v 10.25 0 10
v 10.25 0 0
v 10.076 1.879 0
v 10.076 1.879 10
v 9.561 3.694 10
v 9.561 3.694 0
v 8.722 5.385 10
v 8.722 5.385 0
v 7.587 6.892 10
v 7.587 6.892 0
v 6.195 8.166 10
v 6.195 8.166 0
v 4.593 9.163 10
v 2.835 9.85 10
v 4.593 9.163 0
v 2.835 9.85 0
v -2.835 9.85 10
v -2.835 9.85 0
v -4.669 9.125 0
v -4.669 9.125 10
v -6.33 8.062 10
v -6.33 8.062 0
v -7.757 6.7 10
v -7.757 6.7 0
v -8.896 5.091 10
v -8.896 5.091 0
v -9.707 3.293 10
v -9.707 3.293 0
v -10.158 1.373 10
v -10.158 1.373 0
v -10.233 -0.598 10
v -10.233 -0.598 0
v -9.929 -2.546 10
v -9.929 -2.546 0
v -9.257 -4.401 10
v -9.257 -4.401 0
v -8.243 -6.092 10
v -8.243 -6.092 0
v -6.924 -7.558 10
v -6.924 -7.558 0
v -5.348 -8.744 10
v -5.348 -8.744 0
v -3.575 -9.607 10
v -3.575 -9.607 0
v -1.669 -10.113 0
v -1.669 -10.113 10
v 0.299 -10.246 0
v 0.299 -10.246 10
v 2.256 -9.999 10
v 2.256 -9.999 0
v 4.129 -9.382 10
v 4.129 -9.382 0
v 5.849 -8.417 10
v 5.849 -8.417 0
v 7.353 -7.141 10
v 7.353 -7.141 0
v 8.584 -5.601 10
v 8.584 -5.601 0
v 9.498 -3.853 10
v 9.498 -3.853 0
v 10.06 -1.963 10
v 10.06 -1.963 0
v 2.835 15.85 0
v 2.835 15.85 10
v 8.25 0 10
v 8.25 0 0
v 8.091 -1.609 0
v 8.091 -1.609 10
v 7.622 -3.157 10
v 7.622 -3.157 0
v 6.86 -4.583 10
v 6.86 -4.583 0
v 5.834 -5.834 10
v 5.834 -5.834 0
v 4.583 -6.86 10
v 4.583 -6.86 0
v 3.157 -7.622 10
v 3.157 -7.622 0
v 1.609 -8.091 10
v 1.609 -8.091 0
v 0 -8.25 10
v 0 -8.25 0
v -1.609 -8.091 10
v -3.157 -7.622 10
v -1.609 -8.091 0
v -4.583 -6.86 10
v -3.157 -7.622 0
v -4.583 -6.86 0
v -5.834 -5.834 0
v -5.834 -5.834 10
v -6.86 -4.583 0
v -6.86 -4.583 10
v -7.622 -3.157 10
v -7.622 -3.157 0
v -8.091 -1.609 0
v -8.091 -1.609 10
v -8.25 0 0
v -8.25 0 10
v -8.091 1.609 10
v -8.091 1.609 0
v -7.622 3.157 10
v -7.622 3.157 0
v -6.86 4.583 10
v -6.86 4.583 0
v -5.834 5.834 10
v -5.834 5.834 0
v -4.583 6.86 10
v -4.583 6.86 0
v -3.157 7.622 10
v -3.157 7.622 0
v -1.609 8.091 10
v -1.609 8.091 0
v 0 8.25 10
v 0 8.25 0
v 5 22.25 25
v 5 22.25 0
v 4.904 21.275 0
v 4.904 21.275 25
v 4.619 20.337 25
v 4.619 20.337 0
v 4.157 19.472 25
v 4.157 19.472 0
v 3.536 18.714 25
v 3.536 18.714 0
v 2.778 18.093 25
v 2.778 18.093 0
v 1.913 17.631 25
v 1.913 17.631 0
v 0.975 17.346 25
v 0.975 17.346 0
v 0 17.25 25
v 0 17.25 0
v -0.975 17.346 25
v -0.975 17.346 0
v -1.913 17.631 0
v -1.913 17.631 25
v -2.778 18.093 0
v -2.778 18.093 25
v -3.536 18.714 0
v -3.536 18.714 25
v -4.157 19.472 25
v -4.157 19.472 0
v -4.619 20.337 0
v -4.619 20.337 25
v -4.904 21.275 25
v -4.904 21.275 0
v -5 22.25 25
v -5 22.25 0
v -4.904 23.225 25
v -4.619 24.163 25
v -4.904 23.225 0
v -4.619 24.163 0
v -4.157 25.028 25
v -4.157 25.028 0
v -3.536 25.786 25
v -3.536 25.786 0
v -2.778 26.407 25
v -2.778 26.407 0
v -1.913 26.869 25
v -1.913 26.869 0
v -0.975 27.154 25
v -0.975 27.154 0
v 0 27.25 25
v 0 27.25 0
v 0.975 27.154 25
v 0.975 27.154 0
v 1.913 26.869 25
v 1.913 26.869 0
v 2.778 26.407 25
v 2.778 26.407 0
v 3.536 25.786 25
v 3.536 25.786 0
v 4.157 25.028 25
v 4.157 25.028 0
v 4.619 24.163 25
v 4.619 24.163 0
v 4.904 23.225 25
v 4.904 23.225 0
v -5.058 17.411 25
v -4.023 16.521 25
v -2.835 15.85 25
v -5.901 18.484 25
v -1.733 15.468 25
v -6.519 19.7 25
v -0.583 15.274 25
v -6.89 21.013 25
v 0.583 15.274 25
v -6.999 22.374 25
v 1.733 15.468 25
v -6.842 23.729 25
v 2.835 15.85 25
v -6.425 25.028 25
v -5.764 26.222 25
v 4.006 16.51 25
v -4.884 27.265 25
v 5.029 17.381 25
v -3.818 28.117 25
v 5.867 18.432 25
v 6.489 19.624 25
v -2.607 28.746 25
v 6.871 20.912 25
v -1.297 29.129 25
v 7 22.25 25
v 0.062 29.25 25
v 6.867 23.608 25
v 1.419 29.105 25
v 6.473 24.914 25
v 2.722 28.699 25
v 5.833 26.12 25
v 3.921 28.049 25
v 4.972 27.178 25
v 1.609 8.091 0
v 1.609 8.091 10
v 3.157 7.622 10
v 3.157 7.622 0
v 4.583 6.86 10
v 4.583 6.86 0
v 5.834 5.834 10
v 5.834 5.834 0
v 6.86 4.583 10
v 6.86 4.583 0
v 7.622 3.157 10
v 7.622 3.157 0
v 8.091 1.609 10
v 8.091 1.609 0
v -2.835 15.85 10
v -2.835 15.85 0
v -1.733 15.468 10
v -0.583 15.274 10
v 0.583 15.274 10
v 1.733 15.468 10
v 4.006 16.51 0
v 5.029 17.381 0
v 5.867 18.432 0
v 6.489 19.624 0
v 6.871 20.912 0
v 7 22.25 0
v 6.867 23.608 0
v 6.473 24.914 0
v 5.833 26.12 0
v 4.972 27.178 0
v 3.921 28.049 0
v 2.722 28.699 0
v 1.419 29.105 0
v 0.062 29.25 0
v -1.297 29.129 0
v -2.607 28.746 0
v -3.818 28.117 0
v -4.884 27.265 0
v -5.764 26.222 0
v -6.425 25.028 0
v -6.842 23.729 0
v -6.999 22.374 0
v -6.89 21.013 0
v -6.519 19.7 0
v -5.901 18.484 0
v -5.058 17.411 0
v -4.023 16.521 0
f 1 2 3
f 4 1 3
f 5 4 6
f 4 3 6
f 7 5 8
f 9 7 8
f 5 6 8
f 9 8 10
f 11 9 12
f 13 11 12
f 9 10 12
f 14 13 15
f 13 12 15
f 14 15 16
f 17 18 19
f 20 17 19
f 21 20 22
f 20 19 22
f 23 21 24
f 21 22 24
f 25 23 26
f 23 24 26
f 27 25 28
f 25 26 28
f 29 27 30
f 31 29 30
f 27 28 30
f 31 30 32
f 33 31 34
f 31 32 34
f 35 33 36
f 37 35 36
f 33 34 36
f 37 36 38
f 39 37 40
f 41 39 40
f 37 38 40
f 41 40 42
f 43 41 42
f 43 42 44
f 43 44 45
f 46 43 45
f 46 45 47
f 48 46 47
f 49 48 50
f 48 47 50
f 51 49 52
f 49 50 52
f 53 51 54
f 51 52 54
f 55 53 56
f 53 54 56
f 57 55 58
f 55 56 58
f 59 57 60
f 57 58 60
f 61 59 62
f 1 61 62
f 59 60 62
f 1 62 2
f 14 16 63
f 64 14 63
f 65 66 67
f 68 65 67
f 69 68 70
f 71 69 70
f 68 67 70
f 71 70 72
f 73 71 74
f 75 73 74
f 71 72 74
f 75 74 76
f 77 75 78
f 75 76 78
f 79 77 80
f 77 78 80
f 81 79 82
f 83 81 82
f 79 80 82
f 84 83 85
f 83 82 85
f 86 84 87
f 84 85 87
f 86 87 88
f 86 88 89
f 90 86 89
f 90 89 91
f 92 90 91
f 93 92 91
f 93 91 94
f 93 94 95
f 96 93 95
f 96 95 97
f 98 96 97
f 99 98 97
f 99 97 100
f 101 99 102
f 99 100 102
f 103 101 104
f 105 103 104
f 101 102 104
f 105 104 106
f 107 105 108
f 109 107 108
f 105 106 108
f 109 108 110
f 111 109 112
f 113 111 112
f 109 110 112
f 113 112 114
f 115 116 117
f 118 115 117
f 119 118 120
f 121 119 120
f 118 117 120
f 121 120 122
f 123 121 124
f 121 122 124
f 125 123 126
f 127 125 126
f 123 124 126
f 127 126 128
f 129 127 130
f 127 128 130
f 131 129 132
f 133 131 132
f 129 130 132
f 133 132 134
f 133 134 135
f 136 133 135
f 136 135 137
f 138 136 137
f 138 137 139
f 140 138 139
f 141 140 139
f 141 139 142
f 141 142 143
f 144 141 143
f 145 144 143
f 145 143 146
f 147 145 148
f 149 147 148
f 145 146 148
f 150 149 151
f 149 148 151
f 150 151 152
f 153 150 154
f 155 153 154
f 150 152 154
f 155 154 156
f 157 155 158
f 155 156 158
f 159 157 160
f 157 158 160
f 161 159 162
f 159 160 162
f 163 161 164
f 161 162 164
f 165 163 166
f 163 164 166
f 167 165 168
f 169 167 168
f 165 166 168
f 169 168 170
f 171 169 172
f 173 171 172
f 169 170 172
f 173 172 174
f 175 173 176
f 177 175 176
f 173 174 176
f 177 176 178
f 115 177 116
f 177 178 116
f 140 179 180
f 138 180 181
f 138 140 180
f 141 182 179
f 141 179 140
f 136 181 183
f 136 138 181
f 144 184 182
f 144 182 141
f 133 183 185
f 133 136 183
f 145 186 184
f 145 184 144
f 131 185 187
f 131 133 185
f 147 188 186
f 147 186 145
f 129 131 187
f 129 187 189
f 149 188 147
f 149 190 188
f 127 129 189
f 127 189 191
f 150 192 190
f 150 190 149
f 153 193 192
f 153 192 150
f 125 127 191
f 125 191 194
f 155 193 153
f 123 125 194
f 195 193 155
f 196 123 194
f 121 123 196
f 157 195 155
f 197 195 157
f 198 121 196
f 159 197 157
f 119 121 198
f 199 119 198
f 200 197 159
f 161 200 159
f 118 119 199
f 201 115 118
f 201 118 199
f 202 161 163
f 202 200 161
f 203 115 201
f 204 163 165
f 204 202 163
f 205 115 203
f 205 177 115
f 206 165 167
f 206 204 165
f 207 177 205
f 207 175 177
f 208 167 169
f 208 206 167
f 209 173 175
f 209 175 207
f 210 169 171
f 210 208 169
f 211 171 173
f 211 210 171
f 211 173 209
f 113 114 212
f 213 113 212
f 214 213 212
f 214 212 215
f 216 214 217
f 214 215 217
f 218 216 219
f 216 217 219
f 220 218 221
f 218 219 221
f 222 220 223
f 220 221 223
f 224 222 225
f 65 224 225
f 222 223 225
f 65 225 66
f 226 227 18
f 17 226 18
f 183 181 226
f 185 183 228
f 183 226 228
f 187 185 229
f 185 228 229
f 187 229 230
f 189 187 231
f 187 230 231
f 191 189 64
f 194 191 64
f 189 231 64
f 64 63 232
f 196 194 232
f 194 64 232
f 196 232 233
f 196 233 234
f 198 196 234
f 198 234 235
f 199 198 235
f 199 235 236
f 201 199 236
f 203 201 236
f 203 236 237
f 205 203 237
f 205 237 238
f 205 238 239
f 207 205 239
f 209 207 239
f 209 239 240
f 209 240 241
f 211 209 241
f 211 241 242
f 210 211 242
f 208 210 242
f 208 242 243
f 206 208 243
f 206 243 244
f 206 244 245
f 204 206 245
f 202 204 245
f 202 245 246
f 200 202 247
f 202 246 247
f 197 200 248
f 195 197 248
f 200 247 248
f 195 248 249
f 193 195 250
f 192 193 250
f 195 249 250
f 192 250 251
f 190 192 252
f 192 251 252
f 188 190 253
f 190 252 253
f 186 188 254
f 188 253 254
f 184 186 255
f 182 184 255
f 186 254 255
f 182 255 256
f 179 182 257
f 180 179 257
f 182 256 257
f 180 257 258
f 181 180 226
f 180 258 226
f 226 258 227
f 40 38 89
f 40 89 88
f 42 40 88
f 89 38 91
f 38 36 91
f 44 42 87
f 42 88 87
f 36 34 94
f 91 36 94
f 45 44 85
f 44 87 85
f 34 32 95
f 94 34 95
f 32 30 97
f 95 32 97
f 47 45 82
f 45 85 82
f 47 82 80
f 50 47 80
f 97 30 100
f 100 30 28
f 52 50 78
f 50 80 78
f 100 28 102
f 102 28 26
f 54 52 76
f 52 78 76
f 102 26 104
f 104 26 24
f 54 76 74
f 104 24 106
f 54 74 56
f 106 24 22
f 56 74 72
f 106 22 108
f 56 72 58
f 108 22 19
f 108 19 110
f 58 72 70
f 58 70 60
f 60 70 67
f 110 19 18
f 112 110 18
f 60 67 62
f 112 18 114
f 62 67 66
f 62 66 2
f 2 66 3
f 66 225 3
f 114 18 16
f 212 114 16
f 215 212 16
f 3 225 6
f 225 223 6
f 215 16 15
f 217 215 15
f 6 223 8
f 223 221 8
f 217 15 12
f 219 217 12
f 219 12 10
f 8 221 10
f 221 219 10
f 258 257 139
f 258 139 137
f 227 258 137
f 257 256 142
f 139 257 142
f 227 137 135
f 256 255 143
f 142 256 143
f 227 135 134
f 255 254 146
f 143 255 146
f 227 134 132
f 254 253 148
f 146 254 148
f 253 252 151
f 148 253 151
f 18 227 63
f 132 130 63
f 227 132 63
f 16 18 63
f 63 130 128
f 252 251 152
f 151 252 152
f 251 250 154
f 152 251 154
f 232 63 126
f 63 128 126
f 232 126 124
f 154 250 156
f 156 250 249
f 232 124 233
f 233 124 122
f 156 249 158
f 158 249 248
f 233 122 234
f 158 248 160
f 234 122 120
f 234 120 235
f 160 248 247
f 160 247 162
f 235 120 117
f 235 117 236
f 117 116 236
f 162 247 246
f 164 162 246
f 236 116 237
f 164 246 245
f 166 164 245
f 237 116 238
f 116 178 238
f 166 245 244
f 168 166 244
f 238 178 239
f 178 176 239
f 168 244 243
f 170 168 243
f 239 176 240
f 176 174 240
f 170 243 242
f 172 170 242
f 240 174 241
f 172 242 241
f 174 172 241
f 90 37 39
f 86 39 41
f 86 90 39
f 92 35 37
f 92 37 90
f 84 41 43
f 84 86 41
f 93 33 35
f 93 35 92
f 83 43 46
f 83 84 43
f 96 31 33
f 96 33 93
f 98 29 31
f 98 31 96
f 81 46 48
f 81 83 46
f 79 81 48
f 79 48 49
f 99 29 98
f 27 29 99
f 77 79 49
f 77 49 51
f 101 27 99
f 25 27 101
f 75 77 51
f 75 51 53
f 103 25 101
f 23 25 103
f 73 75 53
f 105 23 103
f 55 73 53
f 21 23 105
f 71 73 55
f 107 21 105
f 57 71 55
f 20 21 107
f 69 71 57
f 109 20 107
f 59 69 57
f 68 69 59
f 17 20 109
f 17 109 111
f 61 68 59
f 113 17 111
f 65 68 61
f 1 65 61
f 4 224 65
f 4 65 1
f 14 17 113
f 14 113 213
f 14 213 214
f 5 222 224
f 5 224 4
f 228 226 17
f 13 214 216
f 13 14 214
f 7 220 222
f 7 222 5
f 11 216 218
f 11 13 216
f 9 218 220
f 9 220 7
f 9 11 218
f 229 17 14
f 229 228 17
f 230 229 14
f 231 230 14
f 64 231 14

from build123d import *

# Parameters (mm, degrees)
F1_DEPTH = 10
F2_DEPTH = 25


with BuildPart() as f1:
    # F0 (on Top) → F1 (new body)
    with BuildSketch(Plane.XY):
        with BuildLine():
            Line((2.8350751381, 17.25), (2.8350751381, 15.84981649))
            ThreePointArc((2.8350751381, 15.84981649), (5.8670915268, 18.4319851995), (7, 22.25))
            ThreePointArc((7, 22.25), (-3.8180148005, 28.1170915268), (-2.8350751381, 15.84981649))
            Line((-2.8350751381, 15.84981649), (-2.8350751381, 17.25))
            Line((-2.8350751381, 17.25), (0, 17.25))
            Line((0, 17.25), (2.8350751381, 17.25))
        make_face()
        with BuildLine():
            ThreePointArc((5, 22.25), (3.5355339059, 18.7144660941), (0, 17.25))
            ThreePointArc((0, 17.25), (-3.5355339059, 25.7855339059), (5, 22.25))
        make_face(mode=Mode.SUBTRACT)
        with BuildLine():
            ThreePointArc((-2.8350751381, 15.84981649), (0, 15.25), (2.8350751381, 15.84981649))
            Line((2.8350751381, 15.84981649), (2.8350751381, 17.25))
            Line((2.8350751381, 17.25), (0, 17.25))
            Line((0, 17.25), (-2.8350751381, 17.25))
            Line((-2.8350751381, 17.25), (-2.8350751381, 15.84981649))
        make_face()
        with BuildLine():
            ThreePointArc((-2.8350751381, 9.8501192359), (0, 10.25), (2.8350751381, 9.8501192359))
            Line((2.8350751381, 9.8501192359), (2.8350751381, 15.84981649))
            ThreePointArc((2.8350751381, 15.84981649), (0, 15.25), (-2.8350751381, 15.84981649))
            Line((-2.8350751381, 15.84981649), (-2.8350751381, 9.8501192359))
        make_face()
        with BuildLine():
            Line((-2.8350751381, 8.25), (0, 8.25))
            Line((0, 8.25), (2.8350751381, 8.25))
            Line((2.8350751381, 8.25), (2.8350751381, 9.8501192359))
            ThreePointArc((2.8350751381, 9.8501192359), (0, 10.25), (-2.8350751381, 9.8501192359))
            Line((-2.8350751381, 9.8501192359), (-2.8350751381, 8.25))
        make_face()
        with BuildLine():
            Line((2.8350751381, 8.25), (0, 8.25))
            Line((0, 8.25), (-2.8350751381, 8.25))
            Line((-2.8350751381, 8.25), (-2.8350751381, 9.8501192359))
            ThreePointArc((-2.8350751381, 9.8501192359), (-6.16453485, -8.1890787078), (10.25, 0))
            ThreePointArc((10.25, 0), (8.1890787078, 6.16453485), (2.8350751381, 9.8501192359))
            Line((2.8350751381, 9.8501192359), (2.8350751381, 8.25))
        make_face()
        with BuildLine():
            ThreePointArc((0, 8.25), (5.8336309448, 5.8336309448), (8.25, 0))
            ThreePointArc((8.25, 0), (-5.8336309448, -5.8336309448), (0, 8.25))
        make_face(mode=Mode.SUBTRACT)
    extrude(amount=F1_DEPTH)

    # F0 (on Top) → F2 (join)
    with BuildSketch(Plane.XY):
        with BuildLine():
            Line((2.8350751381, 17.25), (2.8350751381, 15.84981649))
            ThreePointArc((2.8350751381, 15.84981649), (5.8670915268, 18.4319851995), (7, 22.25))
            ThreePointArc((7, 22.25), (-3.8180148005, 28.1170915268), (-2.8350751381, 15.84981649))
            Line((-2.8350751381, 15.84981649), (-2.8350751381, 17.25))
            Line((-2.8350751381, 17.25), (0, 17.25))
            Line((0, 17.25), (2.8350751381, 17.25))
        make_face()
        with BuildLine():
            ThreePointArc((5, 22.25), (3.5355339059, 18.7144660941), (0, 17.25))
            ThreePointArc((0, 17.25), (-3.5355339059, 25.7855339059), (5, 22.25))
        make_face(mode=Mode.SUBTRACT)
        with BuildLine():
            ThreePointArc((-2.8350751381, 15.84981649), (0, 15.25), (2.8350751381, 15.84981649))
            Line((2.8350751381, 15.84981649), (2.8350751381, 17.25))
            Line((2.8350751381, 17.25), (0, 17.25))
            Line((0, 17.25), (-2.8350751381, 17.25))
            Line((-2.8350751381, 17.25), (-2.8350751381, 15.84981649))
        make_face()
    extrude(amount=F2_DEPTH)


solid = f1.part
